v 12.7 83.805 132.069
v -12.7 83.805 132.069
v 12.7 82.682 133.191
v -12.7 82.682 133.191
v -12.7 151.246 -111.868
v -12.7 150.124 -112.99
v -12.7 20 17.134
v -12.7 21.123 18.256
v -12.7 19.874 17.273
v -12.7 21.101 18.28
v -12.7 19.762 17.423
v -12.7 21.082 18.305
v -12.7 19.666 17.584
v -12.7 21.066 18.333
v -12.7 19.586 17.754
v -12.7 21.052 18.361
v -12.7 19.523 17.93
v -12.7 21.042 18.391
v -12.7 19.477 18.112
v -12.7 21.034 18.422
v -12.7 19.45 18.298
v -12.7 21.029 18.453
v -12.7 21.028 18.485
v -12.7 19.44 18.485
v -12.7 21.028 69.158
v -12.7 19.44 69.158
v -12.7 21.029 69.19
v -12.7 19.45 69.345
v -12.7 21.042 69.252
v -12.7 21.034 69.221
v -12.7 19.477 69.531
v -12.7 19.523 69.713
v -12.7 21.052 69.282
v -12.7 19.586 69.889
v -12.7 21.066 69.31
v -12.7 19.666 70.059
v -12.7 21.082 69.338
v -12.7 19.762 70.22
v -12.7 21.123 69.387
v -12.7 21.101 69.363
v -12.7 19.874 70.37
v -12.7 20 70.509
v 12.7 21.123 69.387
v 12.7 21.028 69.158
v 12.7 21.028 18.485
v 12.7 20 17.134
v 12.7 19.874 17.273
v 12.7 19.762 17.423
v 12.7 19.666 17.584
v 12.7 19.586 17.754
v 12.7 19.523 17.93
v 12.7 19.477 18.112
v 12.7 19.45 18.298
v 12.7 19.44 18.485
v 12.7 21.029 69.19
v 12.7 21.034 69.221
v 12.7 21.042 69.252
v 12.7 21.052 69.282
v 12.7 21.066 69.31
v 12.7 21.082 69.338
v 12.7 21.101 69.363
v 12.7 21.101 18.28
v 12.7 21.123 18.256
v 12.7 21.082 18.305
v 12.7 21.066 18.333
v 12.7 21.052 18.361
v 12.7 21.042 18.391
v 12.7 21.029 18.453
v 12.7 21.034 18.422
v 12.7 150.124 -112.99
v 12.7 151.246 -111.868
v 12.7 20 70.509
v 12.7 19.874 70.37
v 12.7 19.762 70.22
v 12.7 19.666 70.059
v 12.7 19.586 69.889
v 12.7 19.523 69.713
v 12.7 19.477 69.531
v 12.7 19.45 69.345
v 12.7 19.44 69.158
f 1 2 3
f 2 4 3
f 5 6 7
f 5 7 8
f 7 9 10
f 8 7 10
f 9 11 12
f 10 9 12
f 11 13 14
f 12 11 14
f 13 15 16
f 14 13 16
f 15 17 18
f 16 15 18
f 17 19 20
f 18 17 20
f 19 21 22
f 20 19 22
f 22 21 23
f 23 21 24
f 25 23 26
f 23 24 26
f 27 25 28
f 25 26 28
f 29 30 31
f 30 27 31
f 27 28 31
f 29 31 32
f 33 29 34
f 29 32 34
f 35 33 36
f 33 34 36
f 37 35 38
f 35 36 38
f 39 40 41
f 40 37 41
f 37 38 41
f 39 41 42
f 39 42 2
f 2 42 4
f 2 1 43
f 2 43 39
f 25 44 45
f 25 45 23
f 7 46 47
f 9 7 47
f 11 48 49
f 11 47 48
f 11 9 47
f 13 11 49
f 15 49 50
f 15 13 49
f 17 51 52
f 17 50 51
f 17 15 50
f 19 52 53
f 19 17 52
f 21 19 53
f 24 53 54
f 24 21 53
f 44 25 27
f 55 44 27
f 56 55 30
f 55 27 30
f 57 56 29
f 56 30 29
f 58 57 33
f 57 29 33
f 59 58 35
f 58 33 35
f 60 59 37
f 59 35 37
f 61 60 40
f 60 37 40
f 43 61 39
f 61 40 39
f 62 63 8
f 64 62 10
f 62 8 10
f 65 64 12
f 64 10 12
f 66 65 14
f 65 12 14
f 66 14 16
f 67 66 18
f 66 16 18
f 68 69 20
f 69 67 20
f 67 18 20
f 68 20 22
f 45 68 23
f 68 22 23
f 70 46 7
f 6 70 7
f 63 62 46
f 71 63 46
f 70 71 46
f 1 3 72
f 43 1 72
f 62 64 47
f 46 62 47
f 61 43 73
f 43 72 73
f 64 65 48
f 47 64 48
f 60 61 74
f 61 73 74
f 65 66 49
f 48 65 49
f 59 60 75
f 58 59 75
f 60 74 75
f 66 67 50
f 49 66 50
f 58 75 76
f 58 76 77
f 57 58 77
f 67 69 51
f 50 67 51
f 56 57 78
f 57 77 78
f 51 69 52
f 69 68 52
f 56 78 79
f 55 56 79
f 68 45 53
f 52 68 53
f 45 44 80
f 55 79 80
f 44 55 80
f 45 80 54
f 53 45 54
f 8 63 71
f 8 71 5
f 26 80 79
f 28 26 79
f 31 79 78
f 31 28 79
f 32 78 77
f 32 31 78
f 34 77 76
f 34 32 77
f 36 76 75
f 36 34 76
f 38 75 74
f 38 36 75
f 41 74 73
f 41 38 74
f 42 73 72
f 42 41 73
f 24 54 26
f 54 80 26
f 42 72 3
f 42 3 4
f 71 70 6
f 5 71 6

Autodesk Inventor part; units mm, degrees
ref_plane "YZ Plane" through (0, 0, 0) normal (1, 0, 0) x (0, 1, 0)
ref_plane "XZ Plane" through (0, 0, 0) normal (0, 1, 0) x (-1, 0, 0)
ref_plane "XY Plane" through (0, 0, 0) normal (0, 0, 1) x (1, 0, 0)
sketch "Sketch1" plane through (0, 0, 0) normal (0, 1, 0) x (-1, 0, 0)
  line L0 (12.7, 161.925) -> (-12.7, 161.925)
  line L1 (-12.7, 161.925) -> (-12.7, -161.925)
  line L2 (-12.7, -161.925) -> (12.7, -161.925)
  line L3 (12.7, -161.925) -> (12.7, 161.925)
  line L4 (12.7, 161.925) -> (-12.7, -161.925) construction
  line L5 (-12.7, 161.925) -> (12.7, -161.925) construction
  point P0 (0, 0)
  dimension "d0" = 25.4
  dimension "d1" = 323.85
extrude "Extrusion1" add sketch "Sketch1" along normal blind 1.5875
sketch "Sketch2" plane through (0, 1.5875, 0) normal (0, 1, 0) x (1, 0, 0)
  line L0 (-12.7, -161.925) -> (12.7, -161.925) projected
  line L1 (-43.2277, -22.225) -> (46.1542, -22.225)
  point P0 (0, 0)
  dimension "d4" = 139.7
bend part "Bend Part1" radius 0.3234 angle 45 line through (-43.2277, 1.5875, 22.225) along (1, 0, 0) centre toward (0, 1, 0) moving side (0, 0, -1) both sides yes
sketch "Sketch4" plane through (-12.7, 1.6121, 22.3488) normal (0, 0.9238795, -0.3826834) x (1, 0, 0)
  line L0 (25.4, 0) -> (0, 0) projected
  line L1 (25.4, -139.573) -> (25.4, 0) projected
  line L2 (-18.5864, -50.8) -> (43.4016, -50.8)
  point P0 (12.7, 21.2645)
  dimension "d8" = 50.8
bend part "Bend Part2" radius 0.3234 angle 45 line through (-31.2864, 21.0524, 69.2818) along (1, 0, 0) centre toward (0, 0.9238795, -0.3826834) moving side (0, -0.3826834, -0.9238795) both sides yes
properties part number "finger" material "Polycarbonate, Clear"
